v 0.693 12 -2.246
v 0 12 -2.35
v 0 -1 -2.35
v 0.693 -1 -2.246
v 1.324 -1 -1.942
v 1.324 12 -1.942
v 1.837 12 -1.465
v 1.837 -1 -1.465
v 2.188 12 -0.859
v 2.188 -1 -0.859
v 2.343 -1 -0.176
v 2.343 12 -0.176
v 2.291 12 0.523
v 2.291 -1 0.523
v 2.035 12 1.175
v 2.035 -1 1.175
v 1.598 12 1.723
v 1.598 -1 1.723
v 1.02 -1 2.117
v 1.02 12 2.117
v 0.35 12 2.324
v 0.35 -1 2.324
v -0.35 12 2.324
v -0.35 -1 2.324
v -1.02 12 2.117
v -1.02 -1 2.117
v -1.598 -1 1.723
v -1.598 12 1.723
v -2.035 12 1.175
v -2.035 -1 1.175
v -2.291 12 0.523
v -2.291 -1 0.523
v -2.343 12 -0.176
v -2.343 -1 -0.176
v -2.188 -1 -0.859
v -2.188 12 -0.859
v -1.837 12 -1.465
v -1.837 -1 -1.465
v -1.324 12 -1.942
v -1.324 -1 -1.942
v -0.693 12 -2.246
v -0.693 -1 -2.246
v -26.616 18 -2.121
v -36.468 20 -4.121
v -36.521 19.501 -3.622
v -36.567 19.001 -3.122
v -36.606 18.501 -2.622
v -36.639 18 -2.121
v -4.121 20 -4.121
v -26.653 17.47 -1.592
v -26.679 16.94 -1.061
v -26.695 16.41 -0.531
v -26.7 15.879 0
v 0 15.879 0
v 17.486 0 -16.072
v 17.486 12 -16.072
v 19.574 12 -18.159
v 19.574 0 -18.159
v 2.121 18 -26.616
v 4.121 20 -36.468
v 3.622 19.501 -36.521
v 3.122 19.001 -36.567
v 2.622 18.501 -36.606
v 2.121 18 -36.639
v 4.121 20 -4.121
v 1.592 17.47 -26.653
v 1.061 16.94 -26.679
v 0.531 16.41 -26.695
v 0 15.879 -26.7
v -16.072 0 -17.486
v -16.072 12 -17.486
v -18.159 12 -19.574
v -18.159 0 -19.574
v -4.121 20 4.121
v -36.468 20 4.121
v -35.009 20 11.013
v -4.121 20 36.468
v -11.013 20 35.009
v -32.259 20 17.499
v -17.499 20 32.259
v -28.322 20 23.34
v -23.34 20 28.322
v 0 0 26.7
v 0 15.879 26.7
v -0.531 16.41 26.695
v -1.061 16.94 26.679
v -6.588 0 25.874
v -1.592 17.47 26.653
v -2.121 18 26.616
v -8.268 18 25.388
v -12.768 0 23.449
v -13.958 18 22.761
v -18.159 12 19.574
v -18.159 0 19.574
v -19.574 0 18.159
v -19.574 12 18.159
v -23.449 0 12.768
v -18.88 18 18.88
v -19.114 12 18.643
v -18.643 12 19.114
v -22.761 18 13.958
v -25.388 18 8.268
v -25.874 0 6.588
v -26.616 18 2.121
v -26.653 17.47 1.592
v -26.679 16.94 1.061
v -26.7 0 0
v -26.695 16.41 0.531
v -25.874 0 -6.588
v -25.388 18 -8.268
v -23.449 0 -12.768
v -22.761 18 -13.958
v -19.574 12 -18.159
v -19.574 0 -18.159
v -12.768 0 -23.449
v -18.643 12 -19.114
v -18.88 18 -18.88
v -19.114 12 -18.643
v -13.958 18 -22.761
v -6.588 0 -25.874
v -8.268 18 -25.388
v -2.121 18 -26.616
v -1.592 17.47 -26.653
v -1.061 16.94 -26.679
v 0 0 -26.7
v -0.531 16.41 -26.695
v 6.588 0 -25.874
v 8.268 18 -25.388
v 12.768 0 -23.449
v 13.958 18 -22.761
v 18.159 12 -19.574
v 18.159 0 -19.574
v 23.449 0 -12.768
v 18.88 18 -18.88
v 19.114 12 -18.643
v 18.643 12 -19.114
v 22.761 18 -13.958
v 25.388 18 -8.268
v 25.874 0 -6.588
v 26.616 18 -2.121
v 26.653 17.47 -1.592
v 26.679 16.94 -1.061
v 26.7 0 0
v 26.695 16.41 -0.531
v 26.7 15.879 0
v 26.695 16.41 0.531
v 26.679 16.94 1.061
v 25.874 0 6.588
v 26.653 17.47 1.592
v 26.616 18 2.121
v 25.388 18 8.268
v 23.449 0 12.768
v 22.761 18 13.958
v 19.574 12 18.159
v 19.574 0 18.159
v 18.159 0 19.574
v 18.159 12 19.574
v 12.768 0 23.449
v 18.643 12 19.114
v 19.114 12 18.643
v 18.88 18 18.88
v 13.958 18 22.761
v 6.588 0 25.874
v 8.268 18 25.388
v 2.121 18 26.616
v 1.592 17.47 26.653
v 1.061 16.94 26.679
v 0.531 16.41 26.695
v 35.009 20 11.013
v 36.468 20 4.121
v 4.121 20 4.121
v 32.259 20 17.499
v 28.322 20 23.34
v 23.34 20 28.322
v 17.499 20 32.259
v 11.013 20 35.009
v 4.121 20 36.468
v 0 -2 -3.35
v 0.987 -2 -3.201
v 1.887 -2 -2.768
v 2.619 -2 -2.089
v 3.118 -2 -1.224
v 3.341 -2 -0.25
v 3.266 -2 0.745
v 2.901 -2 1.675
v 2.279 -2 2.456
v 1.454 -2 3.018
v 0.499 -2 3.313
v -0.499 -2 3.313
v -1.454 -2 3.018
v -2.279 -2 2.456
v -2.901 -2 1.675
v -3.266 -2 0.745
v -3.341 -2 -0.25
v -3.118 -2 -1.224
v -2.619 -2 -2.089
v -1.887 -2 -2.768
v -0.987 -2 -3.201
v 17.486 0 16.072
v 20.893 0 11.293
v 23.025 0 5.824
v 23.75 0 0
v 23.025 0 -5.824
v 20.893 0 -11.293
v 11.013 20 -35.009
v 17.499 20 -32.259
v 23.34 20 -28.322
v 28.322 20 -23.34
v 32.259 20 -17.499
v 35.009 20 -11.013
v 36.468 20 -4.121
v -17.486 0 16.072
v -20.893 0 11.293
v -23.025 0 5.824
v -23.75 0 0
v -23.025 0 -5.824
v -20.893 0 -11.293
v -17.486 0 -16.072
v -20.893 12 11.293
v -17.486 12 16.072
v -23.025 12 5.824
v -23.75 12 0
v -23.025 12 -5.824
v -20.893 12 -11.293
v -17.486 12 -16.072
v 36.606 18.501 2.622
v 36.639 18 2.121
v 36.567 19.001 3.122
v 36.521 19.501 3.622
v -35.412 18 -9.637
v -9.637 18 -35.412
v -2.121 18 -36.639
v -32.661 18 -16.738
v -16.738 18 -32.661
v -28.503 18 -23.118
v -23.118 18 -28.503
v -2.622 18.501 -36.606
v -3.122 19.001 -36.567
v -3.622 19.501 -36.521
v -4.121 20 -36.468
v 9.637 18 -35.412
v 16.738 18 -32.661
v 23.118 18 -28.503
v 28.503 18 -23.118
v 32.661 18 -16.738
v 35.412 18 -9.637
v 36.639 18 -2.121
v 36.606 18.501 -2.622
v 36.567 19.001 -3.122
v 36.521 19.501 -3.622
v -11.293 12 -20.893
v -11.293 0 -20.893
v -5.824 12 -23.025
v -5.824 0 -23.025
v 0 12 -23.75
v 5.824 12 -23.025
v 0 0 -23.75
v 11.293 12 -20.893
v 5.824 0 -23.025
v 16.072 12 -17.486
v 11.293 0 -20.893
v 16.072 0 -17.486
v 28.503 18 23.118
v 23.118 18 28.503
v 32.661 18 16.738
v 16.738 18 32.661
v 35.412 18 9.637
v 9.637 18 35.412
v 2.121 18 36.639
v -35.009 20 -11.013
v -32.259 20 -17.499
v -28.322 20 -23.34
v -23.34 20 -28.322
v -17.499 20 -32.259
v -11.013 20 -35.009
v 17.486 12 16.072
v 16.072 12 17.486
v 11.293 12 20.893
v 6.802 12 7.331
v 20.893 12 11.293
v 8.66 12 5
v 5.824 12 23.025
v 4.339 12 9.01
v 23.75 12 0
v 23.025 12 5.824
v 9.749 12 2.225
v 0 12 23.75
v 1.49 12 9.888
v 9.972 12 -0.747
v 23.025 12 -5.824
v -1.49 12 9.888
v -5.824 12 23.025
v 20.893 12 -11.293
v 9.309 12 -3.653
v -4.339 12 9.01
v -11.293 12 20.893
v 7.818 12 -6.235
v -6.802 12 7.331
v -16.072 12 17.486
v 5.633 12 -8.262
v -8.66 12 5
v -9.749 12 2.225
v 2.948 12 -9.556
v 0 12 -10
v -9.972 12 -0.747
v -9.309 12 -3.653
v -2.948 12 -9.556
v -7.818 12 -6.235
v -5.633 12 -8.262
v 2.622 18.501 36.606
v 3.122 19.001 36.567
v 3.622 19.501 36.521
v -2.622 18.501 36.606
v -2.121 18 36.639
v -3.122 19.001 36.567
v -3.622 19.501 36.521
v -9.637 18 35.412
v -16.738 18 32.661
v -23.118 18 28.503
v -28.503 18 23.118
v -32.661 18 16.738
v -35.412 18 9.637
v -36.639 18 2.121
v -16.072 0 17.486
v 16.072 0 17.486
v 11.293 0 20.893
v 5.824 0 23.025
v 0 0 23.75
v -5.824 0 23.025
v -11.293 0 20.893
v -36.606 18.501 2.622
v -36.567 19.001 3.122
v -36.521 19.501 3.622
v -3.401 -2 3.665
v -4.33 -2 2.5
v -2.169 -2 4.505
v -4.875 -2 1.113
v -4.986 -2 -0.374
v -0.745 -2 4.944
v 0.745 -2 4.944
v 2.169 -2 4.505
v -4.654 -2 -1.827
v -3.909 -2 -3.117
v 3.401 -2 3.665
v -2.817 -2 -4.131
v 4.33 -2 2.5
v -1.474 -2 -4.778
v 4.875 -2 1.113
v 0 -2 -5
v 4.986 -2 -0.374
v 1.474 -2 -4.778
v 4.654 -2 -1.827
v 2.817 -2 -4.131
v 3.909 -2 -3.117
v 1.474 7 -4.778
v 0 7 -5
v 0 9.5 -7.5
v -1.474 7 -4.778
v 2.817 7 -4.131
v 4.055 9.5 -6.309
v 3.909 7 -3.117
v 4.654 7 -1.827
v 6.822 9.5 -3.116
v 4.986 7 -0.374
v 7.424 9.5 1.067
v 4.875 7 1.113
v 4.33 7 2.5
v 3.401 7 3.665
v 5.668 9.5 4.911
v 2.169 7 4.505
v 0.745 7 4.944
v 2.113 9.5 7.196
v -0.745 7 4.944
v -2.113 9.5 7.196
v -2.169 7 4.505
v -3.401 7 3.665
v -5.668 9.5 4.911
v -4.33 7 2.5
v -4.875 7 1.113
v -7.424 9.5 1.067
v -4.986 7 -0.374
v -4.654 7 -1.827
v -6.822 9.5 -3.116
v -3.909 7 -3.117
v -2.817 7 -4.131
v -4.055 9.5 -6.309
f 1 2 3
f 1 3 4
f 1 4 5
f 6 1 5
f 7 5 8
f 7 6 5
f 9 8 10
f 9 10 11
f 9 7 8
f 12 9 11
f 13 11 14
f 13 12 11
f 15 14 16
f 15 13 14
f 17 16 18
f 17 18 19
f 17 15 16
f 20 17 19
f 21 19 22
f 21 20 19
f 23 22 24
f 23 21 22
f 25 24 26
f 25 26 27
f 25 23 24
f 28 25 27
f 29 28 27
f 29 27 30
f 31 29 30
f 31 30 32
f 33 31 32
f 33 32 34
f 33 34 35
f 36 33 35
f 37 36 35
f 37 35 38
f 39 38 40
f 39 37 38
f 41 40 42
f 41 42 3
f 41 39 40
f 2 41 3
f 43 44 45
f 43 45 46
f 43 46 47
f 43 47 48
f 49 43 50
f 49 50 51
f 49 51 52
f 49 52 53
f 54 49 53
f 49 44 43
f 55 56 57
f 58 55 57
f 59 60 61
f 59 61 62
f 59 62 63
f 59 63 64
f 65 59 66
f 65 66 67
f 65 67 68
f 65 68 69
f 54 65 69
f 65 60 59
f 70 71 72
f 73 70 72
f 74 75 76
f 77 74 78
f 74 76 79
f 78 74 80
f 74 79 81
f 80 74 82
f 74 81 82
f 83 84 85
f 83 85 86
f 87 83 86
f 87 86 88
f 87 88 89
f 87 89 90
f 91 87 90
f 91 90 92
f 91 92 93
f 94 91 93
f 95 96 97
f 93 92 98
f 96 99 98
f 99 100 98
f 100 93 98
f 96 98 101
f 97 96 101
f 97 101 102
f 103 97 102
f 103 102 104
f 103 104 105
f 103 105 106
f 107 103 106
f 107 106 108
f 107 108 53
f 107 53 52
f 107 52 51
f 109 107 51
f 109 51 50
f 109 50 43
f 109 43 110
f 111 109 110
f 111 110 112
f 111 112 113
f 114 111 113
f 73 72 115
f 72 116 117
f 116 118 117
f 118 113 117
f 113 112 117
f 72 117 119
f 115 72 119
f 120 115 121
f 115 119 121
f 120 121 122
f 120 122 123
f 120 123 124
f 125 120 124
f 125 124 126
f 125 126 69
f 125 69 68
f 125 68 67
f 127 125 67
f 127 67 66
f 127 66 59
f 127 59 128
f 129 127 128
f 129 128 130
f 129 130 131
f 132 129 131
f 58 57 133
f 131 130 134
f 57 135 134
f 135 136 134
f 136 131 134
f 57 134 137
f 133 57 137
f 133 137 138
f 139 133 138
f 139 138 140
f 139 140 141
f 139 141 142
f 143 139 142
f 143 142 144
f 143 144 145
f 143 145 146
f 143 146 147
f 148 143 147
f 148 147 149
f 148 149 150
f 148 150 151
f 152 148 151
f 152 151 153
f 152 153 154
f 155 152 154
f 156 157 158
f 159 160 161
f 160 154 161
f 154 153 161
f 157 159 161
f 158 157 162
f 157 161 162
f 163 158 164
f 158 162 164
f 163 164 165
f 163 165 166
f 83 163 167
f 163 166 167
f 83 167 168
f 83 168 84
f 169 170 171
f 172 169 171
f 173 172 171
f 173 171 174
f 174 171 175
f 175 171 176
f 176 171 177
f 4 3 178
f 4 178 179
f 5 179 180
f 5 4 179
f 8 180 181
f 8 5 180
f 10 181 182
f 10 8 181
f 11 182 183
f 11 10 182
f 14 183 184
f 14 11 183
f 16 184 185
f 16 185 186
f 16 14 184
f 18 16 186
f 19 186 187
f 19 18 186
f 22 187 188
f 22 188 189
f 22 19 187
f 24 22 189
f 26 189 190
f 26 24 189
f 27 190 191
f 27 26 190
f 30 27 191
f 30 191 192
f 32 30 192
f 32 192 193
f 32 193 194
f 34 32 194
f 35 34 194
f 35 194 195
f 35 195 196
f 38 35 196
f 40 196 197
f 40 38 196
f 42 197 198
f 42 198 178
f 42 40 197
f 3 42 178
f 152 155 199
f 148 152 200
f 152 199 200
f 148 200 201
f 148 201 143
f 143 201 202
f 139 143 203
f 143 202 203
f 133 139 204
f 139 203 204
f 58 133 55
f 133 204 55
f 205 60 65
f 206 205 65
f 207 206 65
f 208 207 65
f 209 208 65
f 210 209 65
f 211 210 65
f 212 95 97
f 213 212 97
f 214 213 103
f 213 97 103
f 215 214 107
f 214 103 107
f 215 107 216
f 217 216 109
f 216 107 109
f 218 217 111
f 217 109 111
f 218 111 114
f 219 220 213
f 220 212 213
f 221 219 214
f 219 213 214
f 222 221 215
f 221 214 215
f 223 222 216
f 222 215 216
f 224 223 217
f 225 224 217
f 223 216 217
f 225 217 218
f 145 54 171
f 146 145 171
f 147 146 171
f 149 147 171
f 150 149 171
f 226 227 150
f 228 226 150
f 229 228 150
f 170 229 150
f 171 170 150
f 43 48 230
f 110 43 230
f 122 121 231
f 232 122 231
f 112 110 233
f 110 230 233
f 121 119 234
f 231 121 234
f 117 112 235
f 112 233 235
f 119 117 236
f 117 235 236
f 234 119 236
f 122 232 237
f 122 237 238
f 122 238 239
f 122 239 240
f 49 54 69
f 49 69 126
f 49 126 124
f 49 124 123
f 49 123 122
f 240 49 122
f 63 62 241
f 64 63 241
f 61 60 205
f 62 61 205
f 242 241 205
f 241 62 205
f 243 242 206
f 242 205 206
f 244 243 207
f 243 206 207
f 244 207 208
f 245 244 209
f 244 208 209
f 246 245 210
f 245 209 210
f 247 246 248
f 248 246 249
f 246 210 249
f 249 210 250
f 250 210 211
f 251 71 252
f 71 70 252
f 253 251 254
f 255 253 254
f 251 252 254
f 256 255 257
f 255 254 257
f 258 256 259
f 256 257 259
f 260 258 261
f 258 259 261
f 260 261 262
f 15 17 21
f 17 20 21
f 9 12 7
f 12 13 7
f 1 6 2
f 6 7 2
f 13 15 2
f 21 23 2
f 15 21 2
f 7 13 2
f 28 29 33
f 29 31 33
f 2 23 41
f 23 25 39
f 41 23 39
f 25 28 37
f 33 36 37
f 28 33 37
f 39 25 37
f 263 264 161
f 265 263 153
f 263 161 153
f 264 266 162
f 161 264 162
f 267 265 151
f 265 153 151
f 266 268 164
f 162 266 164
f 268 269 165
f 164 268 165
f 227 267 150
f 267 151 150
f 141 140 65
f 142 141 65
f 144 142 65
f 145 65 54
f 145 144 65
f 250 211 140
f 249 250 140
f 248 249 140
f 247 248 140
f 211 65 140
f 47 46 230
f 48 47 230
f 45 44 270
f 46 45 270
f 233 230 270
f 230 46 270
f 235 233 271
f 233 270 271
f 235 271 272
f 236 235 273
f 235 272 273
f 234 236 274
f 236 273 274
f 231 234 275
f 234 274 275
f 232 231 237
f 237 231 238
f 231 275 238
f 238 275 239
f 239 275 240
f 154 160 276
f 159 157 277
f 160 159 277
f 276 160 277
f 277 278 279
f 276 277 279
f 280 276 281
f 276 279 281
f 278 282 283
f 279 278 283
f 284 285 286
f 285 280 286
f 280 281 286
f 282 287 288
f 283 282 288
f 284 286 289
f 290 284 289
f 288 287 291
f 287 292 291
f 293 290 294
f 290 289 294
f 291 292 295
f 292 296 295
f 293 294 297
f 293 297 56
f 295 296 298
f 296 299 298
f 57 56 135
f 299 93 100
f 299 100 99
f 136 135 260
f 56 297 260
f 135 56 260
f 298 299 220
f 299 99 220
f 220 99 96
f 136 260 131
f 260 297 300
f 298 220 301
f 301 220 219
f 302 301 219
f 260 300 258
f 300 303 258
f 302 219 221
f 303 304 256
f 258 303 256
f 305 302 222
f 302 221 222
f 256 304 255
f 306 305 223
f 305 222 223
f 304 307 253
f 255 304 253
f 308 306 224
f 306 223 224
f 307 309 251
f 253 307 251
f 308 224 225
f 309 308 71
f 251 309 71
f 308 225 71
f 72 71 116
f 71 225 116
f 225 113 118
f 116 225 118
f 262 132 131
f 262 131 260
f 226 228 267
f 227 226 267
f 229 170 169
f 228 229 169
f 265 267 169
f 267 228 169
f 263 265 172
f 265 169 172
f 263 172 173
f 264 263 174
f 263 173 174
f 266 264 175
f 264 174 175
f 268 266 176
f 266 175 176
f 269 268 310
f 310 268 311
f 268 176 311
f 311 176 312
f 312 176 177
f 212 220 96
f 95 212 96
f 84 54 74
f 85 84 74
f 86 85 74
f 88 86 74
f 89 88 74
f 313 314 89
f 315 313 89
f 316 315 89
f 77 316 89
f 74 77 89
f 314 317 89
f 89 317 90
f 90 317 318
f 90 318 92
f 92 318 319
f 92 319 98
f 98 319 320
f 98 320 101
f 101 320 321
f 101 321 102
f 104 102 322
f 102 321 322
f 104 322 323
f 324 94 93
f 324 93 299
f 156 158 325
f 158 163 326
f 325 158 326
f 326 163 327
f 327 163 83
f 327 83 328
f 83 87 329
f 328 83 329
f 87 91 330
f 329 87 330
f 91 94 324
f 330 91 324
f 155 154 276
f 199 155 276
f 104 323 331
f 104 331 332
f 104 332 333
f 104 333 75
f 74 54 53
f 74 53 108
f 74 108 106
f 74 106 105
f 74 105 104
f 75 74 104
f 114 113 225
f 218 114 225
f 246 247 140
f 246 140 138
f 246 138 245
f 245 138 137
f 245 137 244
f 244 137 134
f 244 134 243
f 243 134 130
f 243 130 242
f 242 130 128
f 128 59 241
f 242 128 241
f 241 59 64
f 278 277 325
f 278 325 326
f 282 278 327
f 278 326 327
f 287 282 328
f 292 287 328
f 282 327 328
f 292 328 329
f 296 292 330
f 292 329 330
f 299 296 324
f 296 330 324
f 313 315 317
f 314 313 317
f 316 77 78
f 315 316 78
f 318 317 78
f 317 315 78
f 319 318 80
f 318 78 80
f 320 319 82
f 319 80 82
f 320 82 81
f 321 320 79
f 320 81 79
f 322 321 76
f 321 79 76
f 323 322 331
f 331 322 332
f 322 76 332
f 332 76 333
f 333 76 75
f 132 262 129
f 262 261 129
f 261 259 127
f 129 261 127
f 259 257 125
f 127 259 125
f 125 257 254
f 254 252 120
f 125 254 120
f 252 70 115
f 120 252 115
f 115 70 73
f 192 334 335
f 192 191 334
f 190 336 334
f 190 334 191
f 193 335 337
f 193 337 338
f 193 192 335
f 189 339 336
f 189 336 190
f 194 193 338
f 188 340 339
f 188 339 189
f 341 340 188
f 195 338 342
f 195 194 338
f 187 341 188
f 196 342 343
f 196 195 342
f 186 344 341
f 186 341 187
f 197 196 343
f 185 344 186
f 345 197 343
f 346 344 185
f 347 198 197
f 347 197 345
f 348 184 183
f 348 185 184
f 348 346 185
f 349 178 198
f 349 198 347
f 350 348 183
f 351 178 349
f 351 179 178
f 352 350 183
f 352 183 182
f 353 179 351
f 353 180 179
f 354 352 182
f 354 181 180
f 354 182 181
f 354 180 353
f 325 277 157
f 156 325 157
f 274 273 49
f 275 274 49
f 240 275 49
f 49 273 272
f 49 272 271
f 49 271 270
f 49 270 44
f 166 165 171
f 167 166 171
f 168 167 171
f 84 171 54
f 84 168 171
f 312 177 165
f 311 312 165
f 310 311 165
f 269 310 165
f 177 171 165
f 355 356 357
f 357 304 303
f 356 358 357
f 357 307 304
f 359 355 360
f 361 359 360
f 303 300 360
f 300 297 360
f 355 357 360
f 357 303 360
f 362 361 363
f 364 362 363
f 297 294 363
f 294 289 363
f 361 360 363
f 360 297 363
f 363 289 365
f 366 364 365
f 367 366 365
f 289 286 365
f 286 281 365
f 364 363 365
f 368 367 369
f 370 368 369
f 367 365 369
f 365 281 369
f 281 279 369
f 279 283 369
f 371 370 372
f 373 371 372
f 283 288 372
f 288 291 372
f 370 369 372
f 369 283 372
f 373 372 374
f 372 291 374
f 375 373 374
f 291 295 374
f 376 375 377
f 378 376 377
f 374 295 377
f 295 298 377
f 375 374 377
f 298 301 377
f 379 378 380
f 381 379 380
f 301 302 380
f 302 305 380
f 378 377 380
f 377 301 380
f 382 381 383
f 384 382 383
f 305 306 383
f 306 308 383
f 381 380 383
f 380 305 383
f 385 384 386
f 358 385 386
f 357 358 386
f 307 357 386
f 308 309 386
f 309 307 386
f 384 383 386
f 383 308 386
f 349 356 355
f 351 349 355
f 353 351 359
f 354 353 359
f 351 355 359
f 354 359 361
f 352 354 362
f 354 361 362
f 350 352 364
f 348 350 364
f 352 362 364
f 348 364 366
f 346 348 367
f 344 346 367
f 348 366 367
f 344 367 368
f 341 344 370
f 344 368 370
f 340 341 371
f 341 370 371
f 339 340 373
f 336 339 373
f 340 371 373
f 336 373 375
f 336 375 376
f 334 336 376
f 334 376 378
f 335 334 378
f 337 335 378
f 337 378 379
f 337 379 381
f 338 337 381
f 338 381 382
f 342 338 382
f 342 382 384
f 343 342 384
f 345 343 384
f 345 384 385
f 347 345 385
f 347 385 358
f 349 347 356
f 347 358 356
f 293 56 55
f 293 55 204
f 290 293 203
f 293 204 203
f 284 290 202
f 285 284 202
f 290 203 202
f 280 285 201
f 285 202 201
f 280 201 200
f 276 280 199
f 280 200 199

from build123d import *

# Parameters (mm, degrees)
CUT_EXTRUDE1_DEPTH  = 56.621758333
CIRPATTERN1_COUNT   = 4
SKETCH3_R           = 23.75
CUT_EXTRUDE2_DEPTH  = 12
CUT_EXTRUDE3_START  = 12
CUT_EXTRUDE3_DEPTH  = 12
CIRPATTERN2_COUNT   = 4
SKETCH5_R           = 5
SKETCH5_R_2         = 2.35
BOSS_EXTRUDE1_DEPTH = 14
CHAMFER1_SIZE       = 1
CHAMFER2_SIZE       = 5


with BuildPart() as part:
    # Sketch1 → Revolve1 (revolve)
    with BuildSketch(Plane(origin=(0, 0, 0), x_dir=(0, 0, -1), z_dir=(1, 0, 0)), mode=Mode.PRIVATE) as revolve1_sk:
        Polygon((0, 0), (26.7, 0), (26.7, 18), (36.7, 18), (36.7, 20), (0, 20), align=None)
    revolve(revolve1_sk.sketch.rotate(Axis((0, 20, 0), (0, -1, 0)), 180), axis=Axis((0, 20, 0), (0, -1, 0)))

    # Sketch2 → Cut-Extrude1 (cut, symmetric)
    with BuildSketch(Plane.XY):
        Polygon((4.121320344, 20), (0, 15.878679656), (-4.121320344, 20), align=None)
    cut_extrude1 = extrude(amount=CUT_EXTRUDE1_DEPTH, both=True, mode=Mode.SUBTRACT)

    # CirPattern1: Cut-Extrude1 ×4 about axis
    cirpattern1_axis = Axis((0, 0, 0), (0, 1, 0))
    for i in range(1, CIRPATTERN1_COUNT):
        add(cut_extrude1.rotate(cirpattern1_axis, i * 360 / CIRPATTERN1_COUNT), mode=Mode.SUBTRACT)

    # Sketch3 → Cut-Extrude2 (cut)
    with BuildSketch(Plane.XZ):
        with Locations(Location((0, 0, 0), (0, 0, 270))):
            Circle(SKETCH3_R)
    extrude(amount=-CUT_EXTRUDE2_DEPTH, mode=Mode.SUBTRACT)

    # Sketch4 → Cut-Extrude3 (cut)
    with BuildSketch(Plane(origin=(0, 0, 0), x_dir=(1, 0, 0), z_dir=(0, 1, 0)).offset(CUT_EXTRUDE3_START)):
        with BuildLine():
            Line((-25.234076692, -26.648290255), (0, -1.414213562))
            Line((0, -1.414213562), (-1.414213562, 0))
            Line((-1.414213562, 0), (-26.648290255, -25.234076692))
            ThreePointArc((-26.648290255, -25.234076692), (-25.95081887, -25.95081887), (-25.234076692, -26.648290255))
        make_face()
    cut_extrude3 = extrude(amount=-CUT_EXTRUDE3_DEPTH, mode=Mode.SUBTRACT)

    # CirPattern2: Cut-Extrude3 ×4 about axis
    cirpattern2_axis = Axis((0, 0, 0), (0, 1, 0))
    for i in range(1, CIRPATTERN2_COUNT):
        add(cut_extrude3.rotate(cirpattern2_axis, i * 360 / CIRPATTERN2_COUNT), mode=Mode.SUBTRACT)

    # Sketch5 → Boss-Extrude1 (add)
    with BuildSketch(Plane.XZ.offset(-12)):
        with Locations(Location((0, 0, 0), (0, 0, 270))):
            Circle(SKETCH5_R)
        with Locations(Location((0, 0, 0), (0, 0, 270))):
            Circle(SKETCH5_R_2, mode=Mode.SUBTRACT)
    extrude(amount=BOSS_EXTRUDE1_DEPTH)

    # Chamfer1
    chamfer1_edges = [part.edges().sort_by_distance(p)[0] for p in [
        (0, -2, 2.35),
    ]]
    chamfer(chamfer1_edges, length=CHAMFER1_SIZE)

    # Chamfer2
    chamfer2_edges = [part.edges().sort_by_distance(p)[0] for p in [
        (0, 12, 5),
    ]]
    chamfer(chamfer2_edges, length=CHAMFER2_SIZE)


solid = part.part
